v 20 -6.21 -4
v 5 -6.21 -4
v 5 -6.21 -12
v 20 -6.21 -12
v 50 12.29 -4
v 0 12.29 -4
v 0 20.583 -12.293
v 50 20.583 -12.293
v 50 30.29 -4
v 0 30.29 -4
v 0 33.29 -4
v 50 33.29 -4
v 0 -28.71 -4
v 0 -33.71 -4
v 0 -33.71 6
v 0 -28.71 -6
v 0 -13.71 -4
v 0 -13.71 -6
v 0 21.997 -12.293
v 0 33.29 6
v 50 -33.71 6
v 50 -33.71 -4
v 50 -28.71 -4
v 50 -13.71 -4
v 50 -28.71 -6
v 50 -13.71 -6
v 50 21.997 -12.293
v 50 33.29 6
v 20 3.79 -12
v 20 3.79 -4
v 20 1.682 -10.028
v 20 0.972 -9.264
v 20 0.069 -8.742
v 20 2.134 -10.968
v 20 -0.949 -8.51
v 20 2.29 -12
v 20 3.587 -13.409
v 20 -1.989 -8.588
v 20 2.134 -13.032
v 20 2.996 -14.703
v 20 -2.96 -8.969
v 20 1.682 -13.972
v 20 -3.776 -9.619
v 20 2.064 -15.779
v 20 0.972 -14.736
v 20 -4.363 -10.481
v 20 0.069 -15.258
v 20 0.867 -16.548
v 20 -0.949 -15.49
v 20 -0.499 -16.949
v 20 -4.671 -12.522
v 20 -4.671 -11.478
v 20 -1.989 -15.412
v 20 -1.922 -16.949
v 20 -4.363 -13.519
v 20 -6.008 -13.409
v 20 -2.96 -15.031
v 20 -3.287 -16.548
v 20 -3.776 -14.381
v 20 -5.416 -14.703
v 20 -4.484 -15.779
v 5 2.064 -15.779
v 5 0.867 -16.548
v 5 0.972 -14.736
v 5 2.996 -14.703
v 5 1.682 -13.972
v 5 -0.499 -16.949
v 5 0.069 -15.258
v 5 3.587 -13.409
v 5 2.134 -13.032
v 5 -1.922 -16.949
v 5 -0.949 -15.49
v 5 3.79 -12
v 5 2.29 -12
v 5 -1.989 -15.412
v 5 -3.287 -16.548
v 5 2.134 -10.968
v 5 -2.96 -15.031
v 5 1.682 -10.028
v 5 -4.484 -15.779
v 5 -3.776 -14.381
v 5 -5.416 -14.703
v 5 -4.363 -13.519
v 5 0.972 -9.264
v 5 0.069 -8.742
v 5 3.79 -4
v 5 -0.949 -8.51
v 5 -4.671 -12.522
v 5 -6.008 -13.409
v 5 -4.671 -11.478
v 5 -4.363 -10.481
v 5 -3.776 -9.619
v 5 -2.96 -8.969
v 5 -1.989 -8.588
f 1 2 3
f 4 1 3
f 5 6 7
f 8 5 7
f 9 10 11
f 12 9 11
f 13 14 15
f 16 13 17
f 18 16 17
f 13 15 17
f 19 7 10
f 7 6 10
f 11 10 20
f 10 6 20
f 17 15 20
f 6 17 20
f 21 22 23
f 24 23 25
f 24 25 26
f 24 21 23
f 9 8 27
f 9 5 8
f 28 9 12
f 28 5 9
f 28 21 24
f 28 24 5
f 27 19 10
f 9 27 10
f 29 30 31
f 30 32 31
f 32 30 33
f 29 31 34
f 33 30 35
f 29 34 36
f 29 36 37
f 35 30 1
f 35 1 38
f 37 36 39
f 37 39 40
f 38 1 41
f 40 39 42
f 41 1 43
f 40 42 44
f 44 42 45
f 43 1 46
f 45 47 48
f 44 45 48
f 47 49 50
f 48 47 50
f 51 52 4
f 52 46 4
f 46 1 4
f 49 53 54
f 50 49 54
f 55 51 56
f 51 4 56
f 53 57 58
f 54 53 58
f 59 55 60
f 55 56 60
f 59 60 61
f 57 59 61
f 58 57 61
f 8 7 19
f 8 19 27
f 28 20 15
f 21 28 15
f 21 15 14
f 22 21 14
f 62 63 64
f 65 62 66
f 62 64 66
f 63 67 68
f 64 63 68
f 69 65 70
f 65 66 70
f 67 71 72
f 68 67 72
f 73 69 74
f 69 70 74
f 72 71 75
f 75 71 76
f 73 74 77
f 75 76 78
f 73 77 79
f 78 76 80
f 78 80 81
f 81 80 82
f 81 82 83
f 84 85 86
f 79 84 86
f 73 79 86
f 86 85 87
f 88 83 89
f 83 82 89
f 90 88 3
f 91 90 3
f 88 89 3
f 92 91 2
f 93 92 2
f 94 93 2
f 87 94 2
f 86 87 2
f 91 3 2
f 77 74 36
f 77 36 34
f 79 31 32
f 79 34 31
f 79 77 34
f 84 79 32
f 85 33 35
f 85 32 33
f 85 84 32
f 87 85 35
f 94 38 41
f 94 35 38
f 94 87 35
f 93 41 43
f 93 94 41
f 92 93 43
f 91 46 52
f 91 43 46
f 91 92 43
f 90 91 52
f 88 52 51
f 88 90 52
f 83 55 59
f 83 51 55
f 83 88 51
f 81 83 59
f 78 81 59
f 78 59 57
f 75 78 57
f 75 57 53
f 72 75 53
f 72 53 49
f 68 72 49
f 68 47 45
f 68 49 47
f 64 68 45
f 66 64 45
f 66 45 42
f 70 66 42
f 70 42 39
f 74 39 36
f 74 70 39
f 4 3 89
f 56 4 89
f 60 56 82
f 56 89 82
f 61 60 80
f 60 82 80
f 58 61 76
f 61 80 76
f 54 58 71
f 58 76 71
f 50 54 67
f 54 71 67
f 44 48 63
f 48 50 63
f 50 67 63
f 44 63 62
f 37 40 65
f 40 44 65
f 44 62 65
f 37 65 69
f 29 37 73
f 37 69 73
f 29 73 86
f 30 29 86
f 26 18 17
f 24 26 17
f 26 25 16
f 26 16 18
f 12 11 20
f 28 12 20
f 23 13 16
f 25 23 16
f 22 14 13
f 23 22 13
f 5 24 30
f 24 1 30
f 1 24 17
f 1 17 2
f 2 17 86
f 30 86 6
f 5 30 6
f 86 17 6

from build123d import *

# Parameters (mm, degrees)
F0_R     = 3.5
F1_DEPTH = 50
F2_SIZE  = 1
F3_W     = 30
F3_H     = 8
F3_W_2   = 5
F4_DEPTH = 10


with BuildPart() as f1:
    # F0 (on Right) → F1 (new body)
    with BuildSketch(Plane.YZ):
        with BuildLine():
            Line((33.2899148837, -4), (33.2899148837, 6))
            Line((33.2899148837, 6), (-33.7100851163, 6))
            Line((-33.7100851163, 6), (-33.7100851163, -4))
            Line((-33.7100851163, -4), (-28.7100851163, -4))
            Line((-28.7100851163, -4), (-28.7100851163, -6))
            Line((-28.7100851163, -6), (-13.7100851163, -6))
            Line((-13.7100851163, -6), (-13.7100851163, -4))
            Line((-13.7100851163, -4), (-6.2100851163, -4))
            Line((-6.2100851163, -4), (-6.2100851163, -12))
            ThreePointArc((-6.2100851163, -12), (-1.2100851163, -17), (3.7899148837, -12))
            Line((3.7899148837, -12), (3.7899148837, -4))
            Line((3.7899148837, -4), (12.2899148837, -4))
            Line((12.2899148837, -4), (21.2899148837, -13))
            Line((21.2899148837, -13), (30.2899148837, -4))
            Line((30.2899148837, -4), (33.2899148837, -4))
        make_face()
        with Locations((-1.2100851163, -12)):
            Circle(F0_R, mode=Mode.SUBTRACT)
    extrude(amount=F1_DEPTH)

    # F2
    f2_edges = [f1.edges().sort_by_distance(p)[0] for p in [
        (25, 21.289915, -13),
    ]]
    chamfer(f2_edges, length=F2_SIZE)

    # F3 (on face) → F4 (cut, through all)
    with BuildSketch(Plane.XZ.offset(6.2100851163)):
        with Locations((35, -8)):
            Rectangle(F3_W, F3_H)
        Polygon((79.836667031, -4), (50, -4), (50, -12), (20, -12), (20, -31.4453998581), (79.836667031, -31.4453998581), align=None)
        with Locations((2.5, -8)):
            Rectangle(F3_W_2, F3_H)
        Polygon((5, -31.5237529576), (5, -12), (0, -12), (0, -4), (-35.2658848278, -4), (-35.2658848278, -31.5237529576), align=None)
    extrude(amount=-F4_DEPTH, mode=Mode.SUBTRACT)


solid = f1.part
